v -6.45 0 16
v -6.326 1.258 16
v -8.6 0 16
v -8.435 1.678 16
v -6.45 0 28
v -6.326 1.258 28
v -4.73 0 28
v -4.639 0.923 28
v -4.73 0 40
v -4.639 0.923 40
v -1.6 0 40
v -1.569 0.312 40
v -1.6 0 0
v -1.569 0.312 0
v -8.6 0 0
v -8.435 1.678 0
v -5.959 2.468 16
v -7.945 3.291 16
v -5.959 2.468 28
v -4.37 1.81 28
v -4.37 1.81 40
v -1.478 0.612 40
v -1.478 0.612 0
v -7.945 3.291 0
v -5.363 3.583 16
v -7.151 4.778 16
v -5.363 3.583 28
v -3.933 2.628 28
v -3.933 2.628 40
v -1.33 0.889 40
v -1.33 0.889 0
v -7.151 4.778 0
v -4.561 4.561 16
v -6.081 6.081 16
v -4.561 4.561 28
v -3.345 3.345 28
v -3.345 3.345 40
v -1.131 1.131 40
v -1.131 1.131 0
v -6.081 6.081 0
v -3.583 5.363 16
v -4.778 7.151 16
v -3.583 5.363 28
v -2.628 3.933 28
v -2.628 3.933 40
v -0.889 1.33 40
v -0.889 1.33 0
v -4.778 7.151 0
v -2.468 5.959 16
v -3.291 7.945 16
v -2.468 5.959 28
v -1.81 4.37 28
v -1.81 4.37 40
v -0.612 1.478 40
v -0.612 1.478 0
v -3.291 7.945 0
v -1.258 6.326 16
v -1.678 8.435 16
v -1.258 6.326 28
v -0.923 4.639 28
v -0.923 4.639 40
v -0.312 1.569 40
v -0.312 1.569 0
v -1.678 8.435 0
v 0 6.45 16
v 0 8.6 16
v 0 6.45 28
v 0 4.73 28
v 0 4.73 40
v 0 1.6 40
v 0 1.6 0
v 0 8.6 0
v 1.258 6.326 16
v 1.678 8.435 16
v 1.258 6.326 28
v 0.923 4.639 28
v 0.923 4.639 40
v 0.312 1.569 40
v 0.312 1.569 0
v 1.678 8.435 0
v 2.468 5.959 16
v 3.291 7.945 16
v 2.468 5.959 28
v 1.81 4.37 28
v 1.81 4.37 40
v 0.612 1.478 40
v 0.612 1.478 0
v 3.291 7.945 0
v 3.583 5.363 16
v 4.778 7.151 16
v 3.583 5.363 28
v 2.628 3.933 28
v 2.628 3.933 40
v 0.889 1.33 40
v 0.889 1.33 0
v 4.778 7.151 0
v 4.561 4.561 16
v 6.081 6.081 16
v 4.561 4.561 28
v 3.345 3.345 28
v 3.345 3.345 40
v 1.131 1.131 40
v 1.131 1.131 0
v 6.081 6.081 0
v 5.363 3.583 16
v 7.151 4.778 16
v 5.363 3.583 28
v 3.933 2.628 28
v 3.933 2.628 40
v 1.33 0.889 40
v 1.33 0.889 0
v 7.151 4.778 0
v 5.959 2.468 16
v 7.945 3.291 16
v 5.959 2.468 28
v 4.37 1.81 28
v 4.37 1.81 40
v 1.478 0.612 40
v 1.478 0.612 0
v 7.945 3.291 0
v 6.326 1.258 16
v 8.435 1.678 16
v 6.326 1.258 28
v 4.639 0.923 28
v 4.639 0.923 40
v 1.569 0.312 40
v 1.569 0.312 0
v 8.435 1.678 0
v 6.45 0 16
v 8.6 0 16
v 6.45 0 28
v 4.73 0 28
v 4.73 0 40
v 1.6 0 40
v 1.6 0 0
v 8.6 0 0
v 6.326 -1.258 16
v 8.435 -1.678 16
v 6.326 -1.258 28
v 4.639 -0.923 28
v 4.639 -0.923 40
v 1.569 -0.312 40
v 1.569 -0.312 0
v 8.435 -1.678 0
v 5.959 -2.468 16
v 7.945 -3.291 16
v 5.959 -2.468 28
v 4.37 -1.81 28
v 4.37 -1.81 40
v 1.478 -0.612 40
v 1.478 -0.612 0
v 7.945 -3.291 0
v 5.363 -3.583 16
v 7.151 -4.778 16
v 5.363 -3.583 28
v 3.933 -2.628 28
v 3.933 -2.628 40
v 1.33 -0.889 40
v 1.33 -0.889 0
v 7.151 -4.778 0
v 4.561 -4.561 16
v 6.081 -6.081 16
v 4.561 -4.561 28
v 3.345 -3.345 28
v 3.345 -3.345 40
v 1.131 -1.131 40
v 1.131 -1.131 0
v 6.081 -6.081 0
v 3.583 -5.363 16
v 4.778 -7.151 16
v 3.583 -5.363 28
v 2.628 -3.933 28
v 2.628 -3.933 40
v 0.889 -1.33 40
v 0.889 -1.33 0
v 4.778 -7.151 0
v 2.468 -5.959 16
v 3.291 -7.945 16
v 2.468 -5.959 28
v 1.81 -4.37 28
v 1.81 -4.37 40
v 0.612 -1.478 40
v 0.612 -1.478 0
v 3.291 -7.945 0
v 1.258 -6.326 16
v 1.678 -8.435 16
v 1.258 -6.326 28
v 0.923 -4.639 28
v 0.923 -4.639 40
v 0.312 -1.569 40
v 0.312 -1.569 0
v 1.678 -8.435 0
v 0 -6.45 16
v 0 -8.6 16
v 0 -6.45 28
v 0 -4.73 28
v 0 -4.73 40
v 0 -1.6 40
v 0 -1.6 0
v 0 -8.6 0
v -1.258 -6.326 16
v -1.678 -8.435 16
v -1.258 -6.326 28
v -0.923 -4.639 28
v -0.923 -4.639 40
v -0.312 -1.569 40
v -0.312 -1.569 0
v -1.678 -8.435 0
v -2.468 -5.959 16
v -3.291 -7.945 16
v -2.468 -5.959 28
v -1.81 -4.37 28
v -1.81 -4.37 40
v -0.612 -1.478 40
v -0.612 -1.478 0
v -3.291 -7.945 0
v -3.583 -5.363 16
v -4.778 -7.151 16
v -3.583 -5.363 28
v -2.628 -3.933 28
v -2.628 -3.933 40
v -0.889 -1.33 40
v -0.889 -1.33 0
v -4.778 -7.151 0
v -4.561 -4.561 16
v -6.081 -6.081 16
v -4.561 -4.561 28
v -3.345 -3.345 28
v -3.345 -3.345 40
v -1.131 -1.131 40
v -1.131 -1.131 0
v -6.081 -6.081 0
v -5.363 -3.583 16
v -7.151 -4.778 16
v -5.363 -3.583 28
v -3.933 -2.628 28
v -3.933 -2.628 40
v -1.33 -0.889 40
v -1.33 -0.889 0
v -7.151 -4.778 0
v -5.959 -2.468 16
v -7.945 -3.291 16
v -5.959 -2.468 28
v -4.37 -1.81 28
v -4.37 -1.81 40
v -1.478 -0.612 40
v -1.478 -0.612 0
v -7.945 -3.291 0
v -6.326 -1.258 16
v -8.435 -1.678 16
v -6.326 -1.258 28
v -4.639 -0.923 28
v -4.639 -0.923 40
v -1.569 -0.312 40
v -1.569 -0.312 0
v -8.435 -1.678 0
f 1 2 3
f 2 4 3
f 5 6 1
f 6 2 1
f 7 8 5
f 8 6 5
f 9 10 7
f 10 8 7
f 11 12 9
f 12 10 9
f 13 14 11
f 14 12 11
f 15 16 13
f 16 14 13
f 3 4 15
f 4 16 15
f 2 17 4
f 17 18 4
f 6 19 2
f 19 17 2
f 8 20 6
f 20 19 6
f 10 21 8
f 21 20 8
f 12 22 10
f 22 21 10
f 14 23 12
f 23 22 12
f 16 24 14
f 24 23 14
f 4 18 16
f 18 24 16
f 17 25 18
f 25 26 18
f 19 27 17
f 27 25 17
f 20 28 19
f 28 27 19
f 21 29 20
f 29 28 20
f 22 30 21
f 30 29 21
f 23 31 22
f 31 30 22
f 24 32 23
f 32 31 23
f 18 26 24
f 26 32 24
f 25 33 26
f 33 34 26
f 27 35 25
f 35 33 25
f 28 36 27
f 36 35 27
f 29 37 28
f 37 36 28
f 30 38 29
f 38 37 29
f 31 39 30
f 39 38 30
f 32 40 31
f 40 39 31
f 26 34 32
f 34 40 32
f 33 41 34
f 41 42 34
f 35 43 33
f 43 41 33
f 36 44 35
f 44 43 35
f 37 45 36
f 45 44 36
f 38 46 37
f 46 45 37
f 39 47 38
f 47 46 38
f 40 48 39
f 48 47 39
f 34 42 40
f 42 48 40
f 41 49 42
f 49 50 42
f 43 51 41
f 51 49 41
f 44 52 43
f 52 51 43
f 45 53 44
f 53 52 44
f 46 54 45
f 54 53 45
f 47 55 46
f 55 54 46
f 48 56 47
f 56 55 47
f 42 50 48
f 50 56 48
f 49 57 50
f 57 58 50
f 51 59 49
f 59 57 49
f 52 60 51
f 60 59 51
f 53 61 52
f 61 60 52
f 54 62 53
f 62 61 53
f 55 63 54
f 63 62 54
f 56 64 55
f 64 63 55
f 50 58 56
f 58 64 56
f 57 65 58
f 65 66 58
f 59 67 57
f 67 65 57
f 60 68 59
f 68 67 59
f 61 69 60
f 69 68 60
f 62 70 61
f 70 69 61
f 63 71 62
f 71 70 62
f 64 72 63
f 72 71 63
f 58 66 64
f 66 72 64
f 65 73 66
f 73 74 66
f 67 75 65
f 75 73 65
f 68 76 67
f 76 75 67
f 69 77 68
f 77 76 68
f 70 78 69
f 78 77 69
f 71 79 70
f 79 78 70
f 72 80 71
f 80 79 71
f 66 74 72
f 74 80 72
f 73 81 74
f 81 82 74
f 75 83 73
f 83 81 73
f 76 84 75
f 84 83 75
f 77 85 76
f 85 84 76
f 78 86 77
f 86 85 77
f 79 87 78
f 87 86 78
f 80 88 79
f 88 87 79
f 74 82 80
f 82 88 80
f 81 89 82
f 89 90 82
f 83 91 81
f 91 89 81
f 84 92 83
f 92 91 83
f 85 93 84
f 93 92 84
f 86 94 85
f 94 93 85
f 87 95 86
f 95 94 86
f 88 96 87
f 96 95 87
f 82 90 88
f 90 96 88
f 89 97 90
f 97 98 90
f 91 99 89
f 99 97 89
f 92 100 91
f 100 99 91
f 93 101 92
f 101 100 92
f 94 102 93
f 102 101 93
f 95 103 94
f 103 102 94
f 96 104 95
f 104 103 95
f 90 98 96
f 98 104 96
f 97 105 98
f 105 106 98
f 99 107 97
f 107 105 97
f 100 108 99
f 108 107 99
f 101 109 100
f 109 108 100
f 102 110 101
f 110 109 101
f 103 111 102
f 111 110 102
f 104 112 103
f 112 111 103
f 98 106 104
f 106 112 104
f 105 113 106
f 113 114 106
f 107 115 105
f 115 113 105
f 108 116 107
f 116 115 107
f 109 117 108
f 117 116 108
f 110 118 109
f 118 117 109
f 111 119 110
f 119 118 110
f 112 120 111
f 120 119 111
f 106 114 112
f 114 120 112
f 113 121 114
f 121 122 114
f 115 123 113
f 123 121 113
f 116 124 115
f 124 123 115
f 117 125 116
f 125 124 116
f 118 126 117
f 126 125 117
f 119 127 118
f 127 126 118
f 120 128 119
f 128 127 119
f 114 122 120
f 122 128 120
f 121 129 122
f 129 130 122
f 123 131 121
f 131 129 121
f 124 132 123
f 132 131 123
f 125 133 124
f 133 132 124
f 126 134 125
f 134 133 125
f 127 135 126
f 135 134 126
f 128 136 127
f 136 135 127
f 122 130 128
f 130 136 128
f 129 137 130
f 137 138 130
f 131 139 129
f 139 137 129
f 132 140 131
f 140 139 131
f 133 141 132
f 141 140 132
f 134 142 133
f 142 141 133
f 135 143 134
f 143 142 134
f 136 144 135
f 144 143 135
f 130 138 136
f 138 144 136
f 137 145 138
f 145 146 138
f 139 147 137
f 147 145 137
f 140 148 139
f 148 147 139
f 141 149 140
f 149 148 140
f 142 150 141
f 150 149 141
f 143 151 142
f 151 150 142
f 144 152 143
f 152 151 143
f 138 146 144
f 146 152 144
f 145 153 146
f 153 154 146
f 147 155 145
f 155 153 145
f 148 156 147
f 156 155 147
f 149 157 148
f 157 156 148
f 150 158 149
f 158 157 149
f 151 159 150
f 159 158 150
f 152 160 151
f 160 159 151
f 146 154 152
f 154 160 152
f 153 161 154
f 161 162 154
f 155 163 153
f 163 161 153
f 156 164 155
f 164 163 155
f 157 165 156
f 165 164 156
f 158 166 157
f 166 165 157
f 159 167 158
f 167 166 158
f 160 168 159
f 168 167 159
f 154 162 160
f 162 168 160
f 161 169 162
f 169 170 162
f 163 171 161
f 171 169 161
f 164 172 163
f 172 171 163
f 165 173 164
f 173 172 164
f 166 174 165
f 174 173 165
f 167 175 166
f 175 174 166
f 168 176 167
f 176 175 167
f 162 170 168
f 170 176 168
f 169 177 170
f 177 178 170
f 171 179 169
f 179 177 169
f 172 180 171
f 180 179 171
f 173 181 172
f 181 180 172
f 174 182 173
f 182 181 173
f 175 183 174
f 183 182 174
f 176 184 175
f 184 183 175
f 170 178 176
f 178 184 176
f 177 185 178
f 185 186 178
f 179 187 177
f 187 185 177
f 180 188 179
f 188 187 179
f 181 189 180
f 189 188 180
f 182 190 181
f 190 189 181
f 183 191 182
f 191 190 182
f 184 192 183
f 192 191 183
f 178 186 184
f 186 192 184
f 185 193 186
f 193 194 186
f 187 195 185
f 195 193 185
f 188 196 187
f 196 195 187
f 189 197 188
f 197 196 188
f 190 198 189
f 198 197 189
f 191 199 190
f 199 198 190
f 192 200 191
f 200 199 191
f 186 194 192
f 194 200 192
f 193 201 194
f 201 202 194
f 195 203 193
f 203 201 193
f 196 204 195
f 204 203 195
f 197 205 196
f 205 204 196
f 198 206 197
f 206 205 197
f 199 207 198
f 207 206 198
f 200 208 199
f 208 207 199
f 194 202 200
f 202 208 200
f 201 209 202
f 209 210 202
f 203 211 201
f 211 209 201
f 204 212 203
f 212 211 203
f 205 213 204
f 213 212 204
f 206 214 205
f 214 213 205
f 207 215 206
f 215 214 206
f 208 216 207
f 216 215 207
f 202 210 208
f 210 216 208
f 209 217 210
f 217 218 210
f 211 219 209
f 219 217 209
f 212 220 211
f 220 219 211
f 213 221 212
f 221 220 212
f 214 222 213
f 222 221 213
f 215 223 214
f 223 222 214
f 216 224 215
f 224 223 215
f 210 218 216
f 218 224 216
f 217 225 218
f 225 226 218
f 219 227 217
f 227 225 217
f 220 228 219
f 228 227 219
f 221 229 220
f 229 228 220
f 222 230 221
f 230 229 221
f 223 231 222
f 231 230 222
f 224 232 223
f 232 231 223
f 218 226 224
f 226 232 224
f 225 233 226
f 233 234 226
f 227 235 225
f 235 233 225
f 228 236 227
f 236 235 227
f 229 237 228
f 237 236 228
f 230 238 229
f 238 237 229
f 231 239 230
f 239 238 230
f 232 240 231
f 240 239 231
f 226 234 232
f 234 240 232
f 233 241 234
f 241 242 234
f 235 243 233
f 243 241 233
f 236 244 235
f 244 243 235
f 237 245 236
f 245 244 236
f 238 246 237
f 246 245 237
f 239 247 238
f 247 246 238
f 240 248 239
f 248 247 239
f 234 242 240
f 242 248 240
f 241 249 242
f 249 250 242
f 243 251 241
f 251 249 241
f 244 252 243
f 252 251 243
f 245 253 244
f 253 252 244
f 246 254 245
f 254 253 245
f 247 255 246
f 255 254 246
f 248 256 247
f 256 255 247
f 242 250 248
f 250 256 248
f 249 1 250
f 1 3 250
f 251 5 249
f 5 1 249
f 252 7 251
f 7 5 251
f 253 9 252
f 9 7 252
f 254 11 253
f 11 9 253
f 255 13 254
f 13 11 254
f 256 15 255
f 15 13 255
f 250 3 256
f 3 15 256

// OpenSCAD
$fn = 32;

// ----------------------------------------------------------------------
// Profiled standoff: stepped spacer, 40 mm long, bore 3.2 mm
// ----------------------------------------------------------------------

// --- parameters (mm) ---
revolve_angle = 360;      // full turn around the Z axis
profile_points = 8;       // points of the closed outline

profile = [[1.6, 0], [8.6, 0], [8.6, 16], [6.45, 16], [6.45, 28], [4.73, 28], [4.73, 40], [1.6, 40]];  // single closed polygon, 8 points, counter clockwise

// --- the one profile operation ---
rotate_extrude(angle = revolve_angle) polygon(points = profile);
